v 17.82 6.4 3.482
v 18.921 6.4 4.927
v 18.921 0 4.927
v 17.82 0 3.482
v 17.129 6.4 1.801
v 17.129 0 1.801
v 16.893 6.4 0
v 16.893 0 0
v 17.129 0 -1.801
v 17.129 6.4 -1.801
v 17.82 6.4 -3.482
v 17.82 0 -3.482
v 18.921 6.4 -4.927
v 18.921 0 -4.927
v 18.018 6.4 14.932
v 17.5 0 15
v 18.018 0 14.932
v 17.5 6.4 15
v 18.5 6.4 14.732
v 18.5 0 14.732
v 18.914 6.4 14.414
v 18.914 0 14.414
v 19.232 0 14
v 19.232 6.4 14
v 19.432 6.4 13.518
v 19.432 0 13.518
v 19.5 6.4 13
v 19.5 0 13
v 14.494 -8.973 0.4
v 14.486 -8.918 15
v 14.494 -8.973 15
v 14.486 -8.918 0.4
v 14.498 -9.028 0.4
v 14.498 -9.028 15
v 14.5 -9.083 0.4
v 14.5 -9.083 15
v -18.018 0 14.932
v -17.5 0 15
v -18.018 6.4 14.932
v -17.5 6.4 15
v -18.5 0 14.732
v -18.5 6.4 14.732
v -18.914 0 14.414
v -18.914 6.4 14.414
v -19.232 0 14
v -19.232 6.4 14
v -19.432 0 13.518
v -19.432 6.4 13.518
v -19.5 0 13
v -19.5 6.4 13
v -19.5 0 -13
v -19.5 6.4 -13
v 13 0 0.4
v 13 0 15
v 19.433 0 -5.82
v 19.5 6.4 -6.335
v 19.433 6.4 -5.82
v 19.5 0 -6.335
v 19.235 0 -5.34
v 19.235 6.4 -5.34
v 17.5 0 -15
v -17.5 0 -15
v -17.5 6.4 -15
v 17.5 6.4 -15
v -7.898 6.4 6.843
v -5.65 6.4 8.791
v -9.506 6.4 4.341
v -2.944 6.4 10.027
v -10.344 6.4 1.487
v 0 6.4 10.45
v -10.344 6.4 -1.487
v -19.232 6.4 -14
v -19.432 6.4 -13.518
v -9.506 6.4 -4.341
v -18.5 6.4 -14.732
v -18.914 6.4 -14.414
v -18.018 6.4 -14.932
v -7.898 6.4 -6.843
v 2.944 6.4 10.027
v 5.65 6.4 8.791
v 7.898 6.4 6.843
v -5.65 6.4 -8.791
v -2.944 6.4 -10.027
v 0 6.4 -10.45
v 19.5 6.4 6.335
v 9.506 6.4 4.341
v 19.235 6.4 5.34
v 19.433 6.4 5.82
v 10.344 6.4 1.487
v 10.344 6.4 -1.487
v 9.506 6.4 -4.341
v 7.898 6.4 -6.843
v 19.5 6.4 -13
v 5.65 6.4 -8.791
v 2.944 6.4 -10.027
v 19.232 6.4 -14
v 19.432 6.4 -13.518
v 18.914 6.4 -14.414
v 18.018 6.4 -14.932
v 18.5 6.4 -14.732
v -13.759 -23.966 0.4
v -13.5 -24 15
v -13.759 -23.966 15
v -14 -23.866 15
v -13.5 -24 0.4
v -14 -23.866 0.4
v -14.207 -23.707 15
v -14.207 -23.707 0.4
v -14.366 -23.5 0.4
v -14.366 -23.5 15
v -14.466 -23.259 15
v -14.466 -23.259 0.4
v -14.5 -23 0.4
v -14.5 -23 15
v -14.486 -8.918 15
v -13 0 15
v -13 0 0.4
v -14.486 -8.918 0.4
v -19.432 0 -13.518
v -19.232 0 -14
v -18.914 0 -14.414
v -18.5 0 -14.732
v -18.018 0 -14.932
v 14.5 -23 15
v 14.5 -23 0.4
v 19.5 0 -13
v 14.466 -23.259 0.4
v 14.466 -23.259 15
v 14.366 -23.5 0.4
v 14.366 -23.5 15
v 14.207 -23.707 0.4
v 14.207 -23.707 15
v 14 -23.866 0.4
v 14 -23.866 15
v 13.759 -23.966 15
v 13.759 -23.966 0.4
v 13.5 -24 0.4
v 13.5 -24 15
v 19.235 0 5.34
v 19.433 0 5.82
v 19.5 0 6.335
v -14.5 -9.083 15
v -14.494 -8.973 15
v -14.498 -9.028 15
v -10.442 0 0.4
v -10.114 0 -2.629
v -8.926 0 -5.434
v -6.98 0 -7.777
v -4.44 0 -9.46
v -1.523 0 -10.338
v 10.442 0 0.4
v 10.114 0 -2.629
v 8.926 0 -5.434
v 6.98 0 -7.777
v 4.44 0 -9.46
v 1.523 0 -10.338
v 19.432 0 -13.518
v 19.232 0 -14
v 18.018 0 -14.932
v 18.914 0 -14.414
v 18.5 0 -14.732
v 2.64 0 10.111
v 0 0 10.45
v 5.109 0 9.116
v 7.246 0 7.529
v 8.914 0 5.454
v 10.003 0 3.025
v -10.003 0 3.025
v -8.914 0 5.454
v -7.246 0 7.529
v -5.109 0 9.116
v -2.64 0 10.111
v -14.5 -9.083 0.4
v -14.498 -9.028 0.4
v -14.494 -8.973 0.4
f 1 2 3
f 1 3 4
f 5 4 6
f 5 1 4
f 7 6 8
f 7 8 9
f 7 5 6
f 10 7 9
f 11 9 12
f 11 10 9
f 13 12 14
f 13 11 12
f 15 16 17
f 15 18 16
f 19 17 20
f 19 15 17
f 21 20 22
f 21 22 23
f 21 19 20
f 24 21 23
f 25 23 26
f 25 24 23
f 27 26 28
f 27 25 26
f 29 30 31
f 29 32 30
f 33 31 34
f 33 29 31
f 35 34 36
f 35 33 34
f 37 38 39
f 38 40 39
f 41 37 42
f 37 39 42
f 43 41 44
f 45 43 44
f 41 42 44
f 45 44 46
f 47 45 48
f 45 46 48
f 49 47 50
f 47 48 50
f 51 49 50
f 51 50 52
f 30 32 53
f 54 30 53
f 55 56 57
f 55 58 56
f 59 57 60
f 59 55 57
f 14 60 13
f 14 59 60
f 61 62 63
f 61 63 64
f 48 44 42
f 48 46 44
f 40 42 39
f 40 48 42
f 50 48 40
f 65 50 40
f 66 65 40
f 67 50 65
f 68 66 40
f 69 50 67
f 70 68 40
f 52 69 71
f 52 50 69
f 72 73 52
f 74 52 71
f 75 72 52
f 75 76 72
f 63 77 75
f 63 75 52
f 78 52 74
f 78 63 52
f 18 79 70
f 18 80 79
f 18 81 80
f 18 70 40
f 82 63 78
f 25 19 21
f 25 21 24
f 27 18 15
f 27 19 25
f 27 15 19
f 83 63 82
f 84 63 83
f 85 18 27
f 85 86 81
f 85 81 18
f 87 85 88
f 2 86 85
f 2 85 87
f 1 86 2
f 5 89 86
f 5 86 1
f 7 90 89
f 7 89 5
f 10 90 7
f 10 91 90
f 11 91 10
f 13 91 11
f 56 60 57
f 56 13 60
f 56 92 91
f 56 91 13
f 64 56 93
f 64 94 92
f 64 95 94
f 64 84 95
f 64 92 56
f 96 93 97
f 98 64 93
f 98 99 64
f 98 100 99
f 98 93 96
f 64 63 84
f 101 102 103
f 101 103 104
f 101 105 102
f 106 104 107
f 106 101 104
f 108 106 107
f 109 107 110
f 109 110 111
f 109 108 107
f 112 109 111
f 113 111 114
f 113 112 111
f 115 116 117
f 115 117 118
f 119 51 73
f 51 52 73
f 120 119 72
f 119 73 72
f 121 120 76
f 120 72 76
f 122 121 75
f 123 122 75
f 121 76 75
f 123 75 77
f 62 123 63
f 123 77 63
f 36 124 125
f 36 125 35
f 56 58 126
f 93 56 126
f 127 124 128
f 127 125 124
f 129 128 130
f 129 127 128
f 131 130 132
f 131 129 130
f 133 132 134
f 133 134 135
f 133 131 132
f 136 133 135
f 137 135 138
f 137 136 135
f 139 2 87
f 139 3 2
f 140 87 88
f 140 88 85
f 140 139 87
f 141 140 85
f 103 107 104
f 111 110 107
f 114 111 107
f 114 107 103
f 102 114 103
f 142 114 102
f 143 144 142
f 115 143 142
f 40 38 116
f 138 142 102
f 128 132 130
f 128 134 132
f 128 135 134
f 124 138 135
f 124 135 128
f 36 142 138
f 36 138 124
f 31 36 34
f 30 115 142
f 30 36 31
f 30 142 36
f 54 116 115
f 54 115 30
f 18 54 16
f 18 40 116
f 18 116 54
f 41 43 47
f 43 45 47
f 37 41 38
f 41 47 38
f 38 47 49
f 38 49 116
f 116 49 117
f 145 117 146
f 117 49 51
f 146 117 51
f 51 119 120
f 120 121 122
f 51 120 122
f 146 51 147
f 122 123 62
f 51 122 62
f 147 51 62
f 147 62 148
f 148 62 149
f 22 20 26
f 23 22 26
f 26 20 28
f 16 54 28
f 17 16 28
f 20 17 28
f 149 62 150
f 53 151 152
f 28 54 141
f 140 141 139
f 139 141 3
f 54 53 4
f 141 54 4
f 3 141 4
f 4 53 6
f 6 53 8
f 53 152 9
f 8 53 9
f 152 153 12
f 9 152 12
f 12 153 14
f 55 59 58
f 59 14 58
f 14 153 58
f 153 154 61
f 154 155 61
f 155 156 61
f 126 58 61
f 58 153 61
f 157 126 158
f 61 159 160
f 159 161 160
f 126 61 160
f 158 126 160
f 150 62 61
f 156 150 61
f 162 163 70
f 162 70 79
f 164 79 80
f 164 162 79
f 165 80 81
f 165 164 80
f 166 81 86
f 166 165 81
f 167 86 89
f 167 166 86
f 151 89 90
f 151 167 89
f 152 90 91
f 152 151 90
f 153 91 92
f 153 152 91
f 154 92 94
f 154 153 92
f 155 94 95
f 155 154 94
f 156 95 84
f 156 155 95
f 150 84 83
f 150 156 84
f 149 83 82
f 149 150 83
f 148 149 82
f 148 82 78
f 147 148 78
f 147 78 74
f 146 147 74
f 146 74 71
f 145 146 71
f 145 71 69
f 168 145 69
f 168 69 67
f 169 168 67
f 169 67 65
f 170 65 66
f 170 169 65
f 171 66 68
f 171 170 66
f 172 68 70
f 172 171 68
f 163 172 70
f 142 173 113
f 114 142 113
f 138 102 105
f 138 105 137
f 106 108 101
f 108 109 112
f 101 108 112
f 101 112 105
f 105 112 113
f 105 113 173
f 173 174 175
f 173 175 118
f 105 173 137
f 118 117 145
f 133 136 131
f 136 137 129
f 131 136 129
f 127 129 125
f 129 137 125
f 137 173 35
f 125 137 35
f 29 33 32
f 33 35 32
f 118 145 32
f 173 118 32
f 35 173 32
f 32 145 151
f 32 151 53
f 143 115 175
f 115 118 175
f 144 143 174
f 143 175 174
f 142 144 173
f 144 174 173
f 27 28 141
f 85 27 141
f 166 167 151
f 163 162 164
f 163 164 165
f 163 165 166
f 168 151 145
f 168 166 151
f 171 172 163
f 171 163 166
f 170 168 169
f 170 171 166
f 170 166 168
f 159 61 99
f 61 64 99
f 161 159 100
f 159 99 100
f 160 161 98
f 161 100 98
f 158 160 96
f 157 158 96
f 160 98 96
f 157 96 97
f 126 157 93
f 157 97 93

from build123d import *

# Parameters (mm, degrees)
SKETCH1_W           = 39
SKETCH1_H           = 30
SKETCH1_R           = 10.45
BOSS_EXTRUDE1_DEPTH = 6.4
BOSS_EXTRUDE2_DEPTH = 14.6
CUT_EXTRUDE1_DEPTH  = 6.4
FILLET1_R           = 2
FILLET2_R           = 1


with BuildPart() as part:
    # Sketch1 → Boss-Extrude1 (new body)
    with BuildSketch(Plane(origin=(0, 0, 0), x_dir=(1, 0, 0), z_dir=(0, 1, 0))):
        Rectangle(SKETCH1_W, SKETCH1_H)
        with Locations(Location((0, 0, 0), (0, 0, 270))):
            Circle(SKETCH1_R, mode=Mode.SUBTRACT)
    extrude(amount=BOSS_EXTRUDE1_DEPTH)

    # Sketch2 → Boss-Extrude2 (add)
    with BuildSketch(Plane.XY.offset(15)):
        Polygon((-13, 0), (-14.5, -9), (-14.5, -24), (14.5, -24), (14.5, -9), (13, 0), align=None)
    extrude(amount=-BOSS_EXTRUDE2_DEPTH)

    # Sketch3 → Cut-Extrude1 (cut)
    with BuildSketch(Plane(origin=(0, 6.4, 0), x_dir=(1, 0, 0), z_dir=(0, 1, 0))):
        with BuildLine():
            Line((19.5, 5.45), (19.5, -5.45))
            ThreePointArc((19.5, -5.45), (16.892891986, 0), (19.5, 5.45))
        make_face()
    extrude(amount=-CUT_EXTRUDE1_DEPTH, mode=Mode.SUBTRACT)

    # Fillet1
    fillet1_edges = [part.edges().sort_by_distance(p)[0] for p in [
        (19.5, 3.2, -5.45),
        (19.5, 3.2, 5.45),
        (19.5, 3.2, 15),
        (-19.5, 3.2, 15),
        (-19.5, 3.2, -15),
        (19.5, 3.2, -15),
    ]]
    fillet(fillet1_edges, radius=FILLET1_R)

    # Fillet2
    fillet2_edges = [part.edges().sort_by_distance(p)[0] for p in [
        (14.5, -9, 7.7),
        (14.5, -24, 7.7),
        (-14.5, -24, 7.7),
        (-14.5, -9, 7.7),
    ]]
    fillet(fillet2_edges, radius=FILLET2_R)


solid = part.part
